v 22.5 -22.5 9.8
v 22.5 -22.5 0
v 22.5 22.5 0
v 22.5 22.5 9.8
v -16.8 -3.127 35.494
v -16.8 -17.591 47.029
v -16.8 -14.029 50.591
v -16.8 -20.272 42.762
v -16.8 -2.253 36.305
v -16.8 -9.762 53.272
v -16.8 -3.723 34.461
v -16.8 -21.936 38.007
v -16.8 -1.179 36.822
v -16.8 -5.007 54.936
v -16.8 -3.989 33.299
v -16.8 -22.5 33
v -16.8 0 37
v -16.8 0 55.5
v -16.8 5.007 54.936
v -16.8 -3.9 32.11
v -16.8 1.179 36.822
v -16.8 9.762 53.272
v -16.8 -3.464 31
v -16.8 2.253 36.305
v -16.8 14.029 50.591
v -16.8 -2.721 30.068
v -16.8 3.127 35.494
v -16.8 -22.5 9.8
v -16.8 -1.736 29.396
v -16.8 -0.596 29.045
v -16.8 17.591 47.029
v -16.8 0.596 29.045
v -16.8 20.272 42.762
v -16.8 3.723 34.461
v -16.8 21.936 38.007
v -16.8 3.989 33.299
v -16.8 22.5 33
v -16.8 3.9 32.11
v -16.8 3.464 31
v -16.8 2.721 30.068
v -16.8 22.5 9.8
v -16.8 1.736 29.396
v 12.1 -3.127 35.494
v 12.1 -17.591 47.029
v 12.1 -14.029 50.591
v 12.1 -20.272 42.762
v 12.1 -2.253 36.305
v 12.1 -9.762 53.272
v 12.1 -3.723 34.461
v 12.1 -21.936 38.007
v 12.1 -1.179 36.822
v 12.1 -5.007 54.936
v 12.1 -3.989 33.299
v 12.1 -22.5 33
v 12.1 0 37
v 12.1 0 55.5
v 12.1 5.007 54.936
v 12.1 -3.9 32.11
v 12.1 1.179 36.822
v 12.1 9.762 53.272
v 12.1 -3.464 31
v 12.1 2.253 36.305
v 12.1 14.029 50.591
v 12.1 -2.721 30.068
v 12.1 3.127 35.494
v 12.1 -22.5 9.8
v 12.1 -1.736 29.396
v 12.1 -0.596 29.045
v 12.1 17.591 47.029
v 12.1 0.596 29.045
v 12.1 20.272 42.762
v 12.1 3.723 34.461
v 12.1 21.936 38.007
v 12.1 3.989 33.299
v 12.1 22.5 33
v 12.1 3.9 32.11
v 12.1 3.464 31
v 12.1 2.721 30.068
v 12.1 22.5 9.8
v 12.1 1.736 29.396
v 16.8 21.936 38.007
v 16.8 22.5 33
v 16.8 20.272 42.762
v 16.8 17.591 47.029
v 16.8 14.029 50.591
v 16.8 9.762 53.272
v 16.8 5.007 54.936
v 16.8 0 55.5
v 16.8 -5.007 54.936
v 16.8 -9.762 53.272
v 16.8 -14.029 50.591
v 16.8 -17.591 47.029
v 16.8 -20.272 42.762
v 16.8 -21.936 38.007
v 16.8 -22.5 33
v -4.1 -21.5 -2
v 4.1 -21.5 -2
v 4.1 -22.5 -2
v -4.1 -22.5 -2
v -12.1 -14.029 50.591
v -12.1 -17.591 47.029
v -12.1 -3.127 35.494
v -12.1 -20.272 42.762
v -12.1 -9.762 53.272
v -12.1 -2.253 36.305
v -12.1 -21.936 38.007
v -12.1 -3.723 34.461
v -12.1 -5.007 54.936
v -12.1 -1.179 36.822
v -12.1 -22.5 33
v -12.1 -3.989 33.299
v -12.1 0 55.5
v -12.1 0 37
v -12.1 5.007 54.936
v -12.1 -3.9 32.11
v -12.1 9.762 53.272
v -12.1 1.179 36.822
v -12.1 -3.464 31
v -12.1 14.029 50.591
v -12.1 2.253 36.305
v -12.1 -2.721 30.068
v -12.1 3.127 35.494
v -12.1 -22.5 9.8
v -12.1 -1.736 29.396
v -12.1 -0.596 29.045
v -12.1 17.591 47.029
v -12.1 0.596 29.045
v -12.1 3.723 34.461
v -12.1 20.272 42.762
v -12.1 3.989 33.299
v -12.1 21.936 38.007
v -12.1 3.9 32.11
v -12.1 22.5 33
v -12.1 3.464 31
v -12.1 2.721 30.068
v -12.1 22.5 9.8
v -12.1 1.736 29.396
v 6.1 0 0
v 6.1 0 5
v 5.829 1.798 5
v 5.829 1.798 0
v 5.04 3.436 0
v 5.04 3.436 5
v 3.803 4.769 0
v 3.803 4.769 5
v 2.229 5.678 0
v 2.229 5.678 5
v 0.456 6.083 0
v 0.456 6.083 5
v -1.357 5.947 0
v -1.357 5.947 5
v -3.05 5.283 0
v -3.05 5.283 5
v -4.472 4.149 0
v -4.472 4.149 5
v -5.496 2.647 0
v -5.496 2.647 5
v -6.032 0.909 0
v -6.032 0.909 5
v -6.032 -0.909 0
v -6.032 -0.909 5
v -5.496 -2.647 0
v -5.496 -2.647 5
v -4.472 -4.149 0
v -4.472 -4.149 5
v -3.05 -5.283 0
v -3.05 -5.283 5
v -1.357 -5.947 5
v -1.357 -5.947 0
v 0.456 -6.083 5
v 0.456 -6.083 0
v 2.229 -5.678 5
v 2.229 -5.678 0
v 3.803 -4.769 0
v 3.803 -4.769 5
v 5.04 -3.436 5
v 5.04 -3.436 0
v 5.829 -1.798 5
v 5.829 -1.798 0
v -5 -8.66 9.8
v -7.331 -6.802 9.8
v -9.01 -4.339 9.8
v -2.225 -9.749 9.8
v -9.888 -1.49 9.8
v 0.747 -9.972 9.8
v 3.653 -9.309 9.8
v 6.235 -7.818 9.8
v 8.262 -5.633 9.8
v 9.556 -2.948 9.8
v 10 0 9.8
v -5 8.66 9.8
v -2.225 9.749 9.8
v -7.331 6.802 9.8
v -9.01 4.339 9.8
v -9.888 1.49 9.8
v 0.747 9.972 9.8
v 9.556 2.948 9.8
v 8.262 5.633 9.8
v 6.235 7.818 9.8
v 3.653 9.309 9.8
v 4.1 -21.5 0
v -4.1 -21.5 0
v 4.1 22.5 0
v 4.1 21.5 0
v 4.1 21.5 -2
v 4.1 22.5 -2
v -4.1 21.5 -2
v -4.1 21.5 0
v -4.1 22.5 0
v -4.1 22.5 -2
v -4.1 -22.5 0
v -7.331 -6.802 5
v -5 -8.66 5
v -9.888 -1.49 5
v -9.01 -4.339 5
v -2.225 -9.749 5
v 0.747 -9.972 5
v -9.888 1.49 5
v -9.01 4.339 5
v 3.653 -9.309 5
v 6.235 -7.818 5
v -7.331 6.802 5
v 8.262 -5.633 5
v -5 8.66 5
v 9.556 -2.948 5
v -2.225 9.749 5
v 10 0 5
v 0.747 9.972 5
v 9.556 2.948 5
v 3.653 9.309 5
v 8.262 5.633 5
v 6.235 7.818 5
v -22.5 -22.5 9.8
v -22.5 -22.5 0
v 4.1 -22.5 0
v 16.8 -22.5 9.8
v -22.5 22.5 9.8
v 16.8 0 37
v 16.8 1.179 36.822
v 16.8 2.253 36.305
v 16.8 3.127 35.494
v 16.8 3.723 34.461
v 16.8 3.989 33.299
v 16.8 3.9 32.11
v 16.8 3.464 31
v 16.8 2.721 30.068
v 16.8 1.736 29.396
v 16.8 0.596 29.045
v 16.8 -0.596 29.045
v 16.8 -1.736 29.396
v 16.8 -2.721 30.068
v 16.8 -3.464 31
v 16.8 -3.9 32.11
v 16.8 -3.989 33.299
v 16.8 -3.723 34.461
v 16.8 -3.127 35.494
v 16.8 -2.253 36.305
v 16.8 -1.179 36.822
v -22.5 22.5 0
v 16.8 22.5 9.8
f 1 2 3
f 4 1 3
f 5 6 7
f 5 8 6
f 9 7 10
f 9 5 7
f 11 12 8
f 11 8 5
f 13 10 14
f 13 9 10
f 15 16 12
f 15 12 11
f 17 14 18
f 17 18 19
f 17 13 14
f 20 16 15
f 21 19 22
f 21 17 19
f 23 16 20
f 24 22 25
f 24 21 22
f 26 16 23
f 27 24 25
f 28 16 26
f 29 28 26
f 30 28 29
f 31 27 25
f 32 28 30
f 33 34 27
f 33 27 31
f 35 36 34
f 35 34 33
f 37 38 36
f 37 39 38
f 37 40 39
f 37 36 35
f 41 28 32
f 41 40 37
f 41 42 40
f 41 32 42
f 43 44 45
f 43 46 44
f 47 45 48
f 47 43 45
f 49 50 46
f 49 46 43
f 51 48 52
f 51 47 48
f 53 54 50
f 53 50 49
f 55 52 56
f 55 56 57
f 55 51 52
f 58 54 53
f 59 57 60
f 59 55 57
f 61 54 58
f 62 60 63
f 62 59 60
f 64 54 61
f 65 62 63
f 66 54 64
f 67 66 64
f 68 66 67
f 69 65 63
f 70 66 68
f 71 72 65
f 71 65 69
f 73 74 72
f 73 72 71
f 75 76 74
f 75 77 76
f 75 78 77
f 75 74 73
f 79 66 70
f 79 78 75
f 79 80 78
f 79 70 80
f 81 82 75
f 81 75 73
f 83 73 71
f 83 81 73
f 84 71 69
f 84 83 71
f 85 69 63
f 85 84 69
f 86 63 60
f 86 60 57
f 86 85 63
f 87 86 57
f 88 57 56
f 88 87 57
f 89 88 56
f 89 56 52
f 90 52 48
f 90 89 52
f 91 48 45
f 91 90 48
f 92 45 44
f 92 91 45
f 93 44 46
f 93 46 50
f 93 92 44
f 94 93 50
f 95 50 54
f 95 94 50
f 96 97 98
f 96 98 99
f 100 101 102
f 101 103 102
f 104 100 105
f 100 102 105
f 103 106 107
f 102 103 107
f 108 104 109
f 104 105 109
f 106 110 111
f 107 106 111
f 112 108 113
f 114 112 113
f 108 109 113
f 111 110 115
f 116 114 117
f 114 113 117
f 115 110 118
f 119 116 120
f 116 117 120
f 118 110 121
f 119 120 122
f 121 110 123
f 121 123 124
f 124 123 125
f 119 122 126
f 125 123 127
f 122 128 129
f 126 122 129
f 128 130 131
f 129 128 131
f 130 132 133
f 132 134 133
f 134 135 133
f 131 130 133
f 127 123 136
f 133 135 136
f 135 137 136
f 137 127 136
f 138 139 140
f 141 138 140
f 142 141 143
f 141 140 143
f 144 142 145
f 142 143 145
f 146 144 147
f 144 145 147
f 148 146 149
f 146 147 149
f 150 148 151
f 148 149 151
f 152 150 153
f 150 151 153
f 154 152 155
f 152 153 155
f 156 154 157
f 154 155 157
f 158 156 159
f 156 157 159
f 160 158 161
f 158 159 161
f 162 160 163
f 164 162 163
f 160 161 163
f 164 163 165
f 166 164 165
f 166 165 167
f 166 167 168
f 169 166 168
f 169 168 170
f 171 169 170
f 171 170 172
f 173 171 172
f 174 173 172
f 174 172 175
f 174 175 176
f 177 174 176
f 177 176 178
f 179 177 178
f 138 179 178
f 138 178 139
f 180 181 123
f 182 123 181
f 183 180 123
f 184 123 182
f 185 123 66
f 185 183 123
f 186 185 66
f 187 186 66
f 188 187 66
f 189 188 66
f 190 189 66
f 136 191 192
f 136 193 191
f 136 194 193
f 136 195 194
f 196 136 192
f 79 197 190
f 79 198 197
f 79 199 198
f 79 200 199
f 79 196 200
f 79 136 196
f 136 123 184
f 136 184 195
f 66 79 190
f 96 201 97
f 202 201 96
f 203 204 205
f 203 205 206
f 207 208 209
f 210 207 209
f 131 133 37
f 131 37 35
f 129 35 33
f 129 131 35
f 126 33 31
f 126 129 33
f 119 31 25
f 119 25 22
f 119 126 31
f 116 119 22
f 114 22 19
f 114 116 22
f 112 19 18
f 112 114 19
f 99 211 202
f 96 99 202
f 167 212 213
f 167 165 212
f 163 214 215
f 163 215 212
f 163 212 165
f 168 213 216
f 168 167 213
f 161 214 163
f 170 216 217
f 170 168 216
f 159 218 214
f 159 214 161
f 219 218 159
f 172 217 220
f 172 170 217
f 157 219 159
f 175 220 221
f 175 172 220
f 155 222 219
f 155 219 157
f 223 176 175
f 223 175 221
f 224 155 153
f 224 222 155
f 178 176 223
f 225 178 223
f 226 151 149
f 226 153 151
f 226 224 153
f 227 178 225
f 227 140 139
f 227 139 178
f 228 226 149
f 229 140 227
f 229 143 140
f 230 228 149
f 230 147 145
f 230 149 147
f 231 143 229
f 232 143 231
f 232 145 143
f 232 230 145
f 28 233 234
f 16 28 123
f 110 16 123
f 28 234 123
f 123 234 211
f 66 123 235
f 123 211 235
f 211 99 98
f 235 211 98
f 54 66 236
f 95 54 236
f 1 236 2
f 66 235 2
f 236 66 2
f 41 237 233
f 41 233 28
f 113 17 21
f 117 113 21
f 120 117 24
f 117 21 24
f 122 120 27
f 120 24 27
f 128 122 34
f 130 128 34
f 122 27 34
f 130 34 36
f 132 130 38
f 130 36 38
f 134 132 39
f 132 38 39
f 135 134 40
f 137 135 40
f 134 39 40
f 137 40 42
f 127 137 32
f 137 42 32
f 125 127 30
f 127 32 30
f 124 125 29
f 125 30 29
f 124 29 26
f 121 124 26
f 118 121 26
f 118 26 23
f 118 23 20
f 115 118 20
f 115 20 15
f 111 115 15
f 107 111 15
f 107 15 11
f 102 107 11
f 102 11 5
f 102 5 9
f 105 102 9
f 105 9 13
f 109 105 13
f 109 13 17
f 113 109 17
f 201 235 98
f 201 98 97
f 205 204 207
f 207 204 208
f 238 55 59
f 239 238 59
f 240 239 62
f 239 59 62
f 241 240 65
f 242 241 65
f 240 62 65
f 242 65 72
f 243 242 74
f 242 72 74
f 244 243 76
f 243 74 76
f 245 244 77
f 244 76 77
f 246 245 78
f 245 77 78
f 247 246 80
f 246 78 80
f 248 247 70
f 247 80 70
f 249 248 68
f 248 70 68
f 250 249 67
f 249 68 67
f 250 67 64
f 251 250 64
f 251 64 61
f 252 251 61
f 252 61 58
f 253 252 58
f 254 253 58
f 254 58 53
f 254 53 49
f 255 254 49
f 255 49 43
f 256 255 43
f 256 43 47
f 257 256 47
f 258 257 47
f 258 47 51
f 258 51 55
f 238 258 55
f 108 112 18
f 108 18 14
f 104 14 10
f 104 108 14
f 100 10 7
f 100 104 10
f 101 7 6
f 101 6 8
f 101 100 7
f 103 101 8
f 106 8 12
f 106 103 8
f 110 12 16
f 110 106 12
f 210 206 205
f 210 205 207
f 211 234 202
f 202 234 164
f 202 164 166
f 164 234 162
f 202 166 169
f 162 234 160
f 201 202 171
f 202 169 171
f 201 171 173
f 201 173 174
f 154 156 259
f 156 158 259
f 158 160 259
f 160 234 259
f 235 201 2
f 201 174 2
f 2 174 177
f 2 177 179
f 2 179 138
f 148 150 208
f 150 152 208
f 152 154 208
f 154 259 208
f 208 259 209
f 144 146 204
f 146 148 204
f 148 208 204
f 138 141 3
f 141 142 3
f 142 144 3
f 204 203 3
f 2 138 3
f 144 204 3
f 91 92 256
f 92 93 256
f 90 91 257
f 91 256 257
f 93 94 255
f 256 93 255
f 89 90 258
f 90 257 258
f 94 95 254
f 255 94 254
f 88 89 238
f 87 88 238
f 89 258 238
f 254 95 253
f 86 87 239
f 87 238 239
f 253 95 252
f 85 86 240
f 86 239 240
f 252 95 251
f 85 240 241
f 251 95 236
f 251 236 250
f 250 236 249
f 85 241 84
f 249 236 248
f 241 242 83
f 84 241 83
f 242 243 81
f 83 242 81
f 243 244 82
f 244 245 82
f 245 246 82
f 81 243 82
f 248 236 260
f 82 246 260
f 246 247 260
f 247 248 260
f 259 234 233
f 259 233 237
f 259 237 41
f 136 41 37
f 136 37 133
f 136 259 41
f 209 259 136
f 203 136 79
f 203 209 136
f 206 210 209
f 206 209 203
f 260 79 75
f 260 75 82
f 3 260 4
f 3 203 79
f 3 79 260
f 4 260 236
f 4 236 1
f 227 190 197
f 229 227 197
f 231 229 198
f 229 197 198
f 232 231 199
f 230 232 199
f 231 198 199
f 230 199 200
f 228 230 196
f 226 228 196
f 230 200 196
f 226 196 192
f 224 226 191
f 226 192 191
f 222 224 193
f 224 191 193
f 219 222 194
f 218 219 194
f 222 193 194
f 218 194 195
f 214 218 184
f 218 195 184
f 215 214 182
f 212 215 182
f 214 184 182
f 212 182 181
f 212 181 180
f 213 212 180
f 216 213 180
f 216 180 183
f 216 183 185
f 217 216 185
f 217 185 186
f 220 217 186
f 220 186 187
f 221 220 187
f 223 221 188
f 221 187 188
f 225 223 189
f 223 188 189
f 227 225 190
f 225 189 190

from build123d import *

# Parameters (mm, degrees)
SKETCH_1_W          = 45
SKETCH_1_H          = 45
EXTRUDE_1_DEPTH     = 9.8
SKETCH_2_W          = 4.7
SKETCH_2_H          = 45
EXTRUDE_2_DEPTH     = 45.7
CUT_EXTRUDE_START   = -33.6
CUT_EXTRUDE_2_DEPTH = 33.6
SKETCH_4_R          = 4
CUT_EXTRUDE_3_DEPTH = 72.630929074
SKETCH_6_R          = 6.1
CUT_EXTRUDE_5_DEPTH = 56.686533381
SKETCH_7_W          = 8.2
SKETCH_7_H          = 1
EXTRUDE_3_DEPTH     = 2
SKETCH_8_R          = 10
CUT_EXTRUDE_6_DEPTH = 4.8


# Read off the part's stored shape, not the designer's step: 切除-拉伸2
with BuildPart() as part:
    # 草图1 → 凸台-拉伸1 (new body)
    with BuildSketch(Plane.XY):
        Rectangle(SKETCH_1_W, SKETCH_1_H)
    extrude(amount=EXTRUDE_1_DEPTH)

    # 草图2 → 凸台-拉伸2 (add)
    with BuildSketch(Plane.XY.offset(9.8)):
        with Locations((-14.45, 0)):
            Rectangle(SKETCH_2_W, SKETCH_2_H)
        with Locations((14.45, 0)):
            Rectangle(SKETCH_2_W, SKETCH_2_H)
    extrude(amount=EXTRUDE_2_DEPTH)

    # 切除-拉伸2 outline → 切除-拉伸2 (cut)
    with BuildSketch(Plane.ZY.offset(16.8).offset(CUT_EXTRUDE_START)):
        with BuildLine():
            Line((55.5, 22.5), (33, 22.5))
            ThreePointArc((33, 22.5), (48.909902577, 15.909902577), (55.5, 0))
            Line((55.5, 0), (55.5, 22.5))
        make_face()
        with BuildLine():
            Line((55.5, -22.5), (55.5, 0))
            ThreePointArc((55.5, 0), (48.909902577, -15.909902577), (33, -22.5))
            Line((33, -22.5), (55.5, -22.5))
        make_face()
    extrude(amount=CUT_EXTRUDE_2_DEPTH, mode=Mode.SUBTRACT)

    # 草图4 → 切除-拉伸3 (cut, through all)
    with BuildSketch(Plane.ZY.offset(16.8)):
        with Locations((33, 0)):
            Circle(SKETCH_4_R)
    extrude(amount=-CUT_EXTRUDE_3_DEPTH, mode=Mode.SUBTRACT)

    # 草图6 → 切除-拉伸5 (cut, through all)
    with BuildSketch(Plane.XY.offset(9.8)):
        Circle(SKETCH_6_R)
    extrude(amount=-CUT_EXTRUDE_5_DEPTH, mode=Mode.SUBTRACT)

    # 草图7 → 凸台-拉伸3 (add)
    with BuildSketch(Plane(origin=(0, 0, 0), x_dir=(-1, 0, 0), z_dir=(0, 0, -1))):
        with Locations((0, 22)):
            Rectangle(SKETCH_7_W, SKETCH_7_H)
        with Locations((0, -22)):
            Rectangle(SKETCH_7_W, SKETCH_7_H)
    extrude(amount=EXTRUDE_3_DEPTH)

    # 草图8 → 切除-拉伸6 (cut)
    with BuildSketch(Plane.XY.offset(9.8)):
        Circle(SKETCH_8_R)
    extrude(amount=-CUT_EXTRUDE_6_DEPTH, mode=Mode.SUBTRACT)


solid = part.part
